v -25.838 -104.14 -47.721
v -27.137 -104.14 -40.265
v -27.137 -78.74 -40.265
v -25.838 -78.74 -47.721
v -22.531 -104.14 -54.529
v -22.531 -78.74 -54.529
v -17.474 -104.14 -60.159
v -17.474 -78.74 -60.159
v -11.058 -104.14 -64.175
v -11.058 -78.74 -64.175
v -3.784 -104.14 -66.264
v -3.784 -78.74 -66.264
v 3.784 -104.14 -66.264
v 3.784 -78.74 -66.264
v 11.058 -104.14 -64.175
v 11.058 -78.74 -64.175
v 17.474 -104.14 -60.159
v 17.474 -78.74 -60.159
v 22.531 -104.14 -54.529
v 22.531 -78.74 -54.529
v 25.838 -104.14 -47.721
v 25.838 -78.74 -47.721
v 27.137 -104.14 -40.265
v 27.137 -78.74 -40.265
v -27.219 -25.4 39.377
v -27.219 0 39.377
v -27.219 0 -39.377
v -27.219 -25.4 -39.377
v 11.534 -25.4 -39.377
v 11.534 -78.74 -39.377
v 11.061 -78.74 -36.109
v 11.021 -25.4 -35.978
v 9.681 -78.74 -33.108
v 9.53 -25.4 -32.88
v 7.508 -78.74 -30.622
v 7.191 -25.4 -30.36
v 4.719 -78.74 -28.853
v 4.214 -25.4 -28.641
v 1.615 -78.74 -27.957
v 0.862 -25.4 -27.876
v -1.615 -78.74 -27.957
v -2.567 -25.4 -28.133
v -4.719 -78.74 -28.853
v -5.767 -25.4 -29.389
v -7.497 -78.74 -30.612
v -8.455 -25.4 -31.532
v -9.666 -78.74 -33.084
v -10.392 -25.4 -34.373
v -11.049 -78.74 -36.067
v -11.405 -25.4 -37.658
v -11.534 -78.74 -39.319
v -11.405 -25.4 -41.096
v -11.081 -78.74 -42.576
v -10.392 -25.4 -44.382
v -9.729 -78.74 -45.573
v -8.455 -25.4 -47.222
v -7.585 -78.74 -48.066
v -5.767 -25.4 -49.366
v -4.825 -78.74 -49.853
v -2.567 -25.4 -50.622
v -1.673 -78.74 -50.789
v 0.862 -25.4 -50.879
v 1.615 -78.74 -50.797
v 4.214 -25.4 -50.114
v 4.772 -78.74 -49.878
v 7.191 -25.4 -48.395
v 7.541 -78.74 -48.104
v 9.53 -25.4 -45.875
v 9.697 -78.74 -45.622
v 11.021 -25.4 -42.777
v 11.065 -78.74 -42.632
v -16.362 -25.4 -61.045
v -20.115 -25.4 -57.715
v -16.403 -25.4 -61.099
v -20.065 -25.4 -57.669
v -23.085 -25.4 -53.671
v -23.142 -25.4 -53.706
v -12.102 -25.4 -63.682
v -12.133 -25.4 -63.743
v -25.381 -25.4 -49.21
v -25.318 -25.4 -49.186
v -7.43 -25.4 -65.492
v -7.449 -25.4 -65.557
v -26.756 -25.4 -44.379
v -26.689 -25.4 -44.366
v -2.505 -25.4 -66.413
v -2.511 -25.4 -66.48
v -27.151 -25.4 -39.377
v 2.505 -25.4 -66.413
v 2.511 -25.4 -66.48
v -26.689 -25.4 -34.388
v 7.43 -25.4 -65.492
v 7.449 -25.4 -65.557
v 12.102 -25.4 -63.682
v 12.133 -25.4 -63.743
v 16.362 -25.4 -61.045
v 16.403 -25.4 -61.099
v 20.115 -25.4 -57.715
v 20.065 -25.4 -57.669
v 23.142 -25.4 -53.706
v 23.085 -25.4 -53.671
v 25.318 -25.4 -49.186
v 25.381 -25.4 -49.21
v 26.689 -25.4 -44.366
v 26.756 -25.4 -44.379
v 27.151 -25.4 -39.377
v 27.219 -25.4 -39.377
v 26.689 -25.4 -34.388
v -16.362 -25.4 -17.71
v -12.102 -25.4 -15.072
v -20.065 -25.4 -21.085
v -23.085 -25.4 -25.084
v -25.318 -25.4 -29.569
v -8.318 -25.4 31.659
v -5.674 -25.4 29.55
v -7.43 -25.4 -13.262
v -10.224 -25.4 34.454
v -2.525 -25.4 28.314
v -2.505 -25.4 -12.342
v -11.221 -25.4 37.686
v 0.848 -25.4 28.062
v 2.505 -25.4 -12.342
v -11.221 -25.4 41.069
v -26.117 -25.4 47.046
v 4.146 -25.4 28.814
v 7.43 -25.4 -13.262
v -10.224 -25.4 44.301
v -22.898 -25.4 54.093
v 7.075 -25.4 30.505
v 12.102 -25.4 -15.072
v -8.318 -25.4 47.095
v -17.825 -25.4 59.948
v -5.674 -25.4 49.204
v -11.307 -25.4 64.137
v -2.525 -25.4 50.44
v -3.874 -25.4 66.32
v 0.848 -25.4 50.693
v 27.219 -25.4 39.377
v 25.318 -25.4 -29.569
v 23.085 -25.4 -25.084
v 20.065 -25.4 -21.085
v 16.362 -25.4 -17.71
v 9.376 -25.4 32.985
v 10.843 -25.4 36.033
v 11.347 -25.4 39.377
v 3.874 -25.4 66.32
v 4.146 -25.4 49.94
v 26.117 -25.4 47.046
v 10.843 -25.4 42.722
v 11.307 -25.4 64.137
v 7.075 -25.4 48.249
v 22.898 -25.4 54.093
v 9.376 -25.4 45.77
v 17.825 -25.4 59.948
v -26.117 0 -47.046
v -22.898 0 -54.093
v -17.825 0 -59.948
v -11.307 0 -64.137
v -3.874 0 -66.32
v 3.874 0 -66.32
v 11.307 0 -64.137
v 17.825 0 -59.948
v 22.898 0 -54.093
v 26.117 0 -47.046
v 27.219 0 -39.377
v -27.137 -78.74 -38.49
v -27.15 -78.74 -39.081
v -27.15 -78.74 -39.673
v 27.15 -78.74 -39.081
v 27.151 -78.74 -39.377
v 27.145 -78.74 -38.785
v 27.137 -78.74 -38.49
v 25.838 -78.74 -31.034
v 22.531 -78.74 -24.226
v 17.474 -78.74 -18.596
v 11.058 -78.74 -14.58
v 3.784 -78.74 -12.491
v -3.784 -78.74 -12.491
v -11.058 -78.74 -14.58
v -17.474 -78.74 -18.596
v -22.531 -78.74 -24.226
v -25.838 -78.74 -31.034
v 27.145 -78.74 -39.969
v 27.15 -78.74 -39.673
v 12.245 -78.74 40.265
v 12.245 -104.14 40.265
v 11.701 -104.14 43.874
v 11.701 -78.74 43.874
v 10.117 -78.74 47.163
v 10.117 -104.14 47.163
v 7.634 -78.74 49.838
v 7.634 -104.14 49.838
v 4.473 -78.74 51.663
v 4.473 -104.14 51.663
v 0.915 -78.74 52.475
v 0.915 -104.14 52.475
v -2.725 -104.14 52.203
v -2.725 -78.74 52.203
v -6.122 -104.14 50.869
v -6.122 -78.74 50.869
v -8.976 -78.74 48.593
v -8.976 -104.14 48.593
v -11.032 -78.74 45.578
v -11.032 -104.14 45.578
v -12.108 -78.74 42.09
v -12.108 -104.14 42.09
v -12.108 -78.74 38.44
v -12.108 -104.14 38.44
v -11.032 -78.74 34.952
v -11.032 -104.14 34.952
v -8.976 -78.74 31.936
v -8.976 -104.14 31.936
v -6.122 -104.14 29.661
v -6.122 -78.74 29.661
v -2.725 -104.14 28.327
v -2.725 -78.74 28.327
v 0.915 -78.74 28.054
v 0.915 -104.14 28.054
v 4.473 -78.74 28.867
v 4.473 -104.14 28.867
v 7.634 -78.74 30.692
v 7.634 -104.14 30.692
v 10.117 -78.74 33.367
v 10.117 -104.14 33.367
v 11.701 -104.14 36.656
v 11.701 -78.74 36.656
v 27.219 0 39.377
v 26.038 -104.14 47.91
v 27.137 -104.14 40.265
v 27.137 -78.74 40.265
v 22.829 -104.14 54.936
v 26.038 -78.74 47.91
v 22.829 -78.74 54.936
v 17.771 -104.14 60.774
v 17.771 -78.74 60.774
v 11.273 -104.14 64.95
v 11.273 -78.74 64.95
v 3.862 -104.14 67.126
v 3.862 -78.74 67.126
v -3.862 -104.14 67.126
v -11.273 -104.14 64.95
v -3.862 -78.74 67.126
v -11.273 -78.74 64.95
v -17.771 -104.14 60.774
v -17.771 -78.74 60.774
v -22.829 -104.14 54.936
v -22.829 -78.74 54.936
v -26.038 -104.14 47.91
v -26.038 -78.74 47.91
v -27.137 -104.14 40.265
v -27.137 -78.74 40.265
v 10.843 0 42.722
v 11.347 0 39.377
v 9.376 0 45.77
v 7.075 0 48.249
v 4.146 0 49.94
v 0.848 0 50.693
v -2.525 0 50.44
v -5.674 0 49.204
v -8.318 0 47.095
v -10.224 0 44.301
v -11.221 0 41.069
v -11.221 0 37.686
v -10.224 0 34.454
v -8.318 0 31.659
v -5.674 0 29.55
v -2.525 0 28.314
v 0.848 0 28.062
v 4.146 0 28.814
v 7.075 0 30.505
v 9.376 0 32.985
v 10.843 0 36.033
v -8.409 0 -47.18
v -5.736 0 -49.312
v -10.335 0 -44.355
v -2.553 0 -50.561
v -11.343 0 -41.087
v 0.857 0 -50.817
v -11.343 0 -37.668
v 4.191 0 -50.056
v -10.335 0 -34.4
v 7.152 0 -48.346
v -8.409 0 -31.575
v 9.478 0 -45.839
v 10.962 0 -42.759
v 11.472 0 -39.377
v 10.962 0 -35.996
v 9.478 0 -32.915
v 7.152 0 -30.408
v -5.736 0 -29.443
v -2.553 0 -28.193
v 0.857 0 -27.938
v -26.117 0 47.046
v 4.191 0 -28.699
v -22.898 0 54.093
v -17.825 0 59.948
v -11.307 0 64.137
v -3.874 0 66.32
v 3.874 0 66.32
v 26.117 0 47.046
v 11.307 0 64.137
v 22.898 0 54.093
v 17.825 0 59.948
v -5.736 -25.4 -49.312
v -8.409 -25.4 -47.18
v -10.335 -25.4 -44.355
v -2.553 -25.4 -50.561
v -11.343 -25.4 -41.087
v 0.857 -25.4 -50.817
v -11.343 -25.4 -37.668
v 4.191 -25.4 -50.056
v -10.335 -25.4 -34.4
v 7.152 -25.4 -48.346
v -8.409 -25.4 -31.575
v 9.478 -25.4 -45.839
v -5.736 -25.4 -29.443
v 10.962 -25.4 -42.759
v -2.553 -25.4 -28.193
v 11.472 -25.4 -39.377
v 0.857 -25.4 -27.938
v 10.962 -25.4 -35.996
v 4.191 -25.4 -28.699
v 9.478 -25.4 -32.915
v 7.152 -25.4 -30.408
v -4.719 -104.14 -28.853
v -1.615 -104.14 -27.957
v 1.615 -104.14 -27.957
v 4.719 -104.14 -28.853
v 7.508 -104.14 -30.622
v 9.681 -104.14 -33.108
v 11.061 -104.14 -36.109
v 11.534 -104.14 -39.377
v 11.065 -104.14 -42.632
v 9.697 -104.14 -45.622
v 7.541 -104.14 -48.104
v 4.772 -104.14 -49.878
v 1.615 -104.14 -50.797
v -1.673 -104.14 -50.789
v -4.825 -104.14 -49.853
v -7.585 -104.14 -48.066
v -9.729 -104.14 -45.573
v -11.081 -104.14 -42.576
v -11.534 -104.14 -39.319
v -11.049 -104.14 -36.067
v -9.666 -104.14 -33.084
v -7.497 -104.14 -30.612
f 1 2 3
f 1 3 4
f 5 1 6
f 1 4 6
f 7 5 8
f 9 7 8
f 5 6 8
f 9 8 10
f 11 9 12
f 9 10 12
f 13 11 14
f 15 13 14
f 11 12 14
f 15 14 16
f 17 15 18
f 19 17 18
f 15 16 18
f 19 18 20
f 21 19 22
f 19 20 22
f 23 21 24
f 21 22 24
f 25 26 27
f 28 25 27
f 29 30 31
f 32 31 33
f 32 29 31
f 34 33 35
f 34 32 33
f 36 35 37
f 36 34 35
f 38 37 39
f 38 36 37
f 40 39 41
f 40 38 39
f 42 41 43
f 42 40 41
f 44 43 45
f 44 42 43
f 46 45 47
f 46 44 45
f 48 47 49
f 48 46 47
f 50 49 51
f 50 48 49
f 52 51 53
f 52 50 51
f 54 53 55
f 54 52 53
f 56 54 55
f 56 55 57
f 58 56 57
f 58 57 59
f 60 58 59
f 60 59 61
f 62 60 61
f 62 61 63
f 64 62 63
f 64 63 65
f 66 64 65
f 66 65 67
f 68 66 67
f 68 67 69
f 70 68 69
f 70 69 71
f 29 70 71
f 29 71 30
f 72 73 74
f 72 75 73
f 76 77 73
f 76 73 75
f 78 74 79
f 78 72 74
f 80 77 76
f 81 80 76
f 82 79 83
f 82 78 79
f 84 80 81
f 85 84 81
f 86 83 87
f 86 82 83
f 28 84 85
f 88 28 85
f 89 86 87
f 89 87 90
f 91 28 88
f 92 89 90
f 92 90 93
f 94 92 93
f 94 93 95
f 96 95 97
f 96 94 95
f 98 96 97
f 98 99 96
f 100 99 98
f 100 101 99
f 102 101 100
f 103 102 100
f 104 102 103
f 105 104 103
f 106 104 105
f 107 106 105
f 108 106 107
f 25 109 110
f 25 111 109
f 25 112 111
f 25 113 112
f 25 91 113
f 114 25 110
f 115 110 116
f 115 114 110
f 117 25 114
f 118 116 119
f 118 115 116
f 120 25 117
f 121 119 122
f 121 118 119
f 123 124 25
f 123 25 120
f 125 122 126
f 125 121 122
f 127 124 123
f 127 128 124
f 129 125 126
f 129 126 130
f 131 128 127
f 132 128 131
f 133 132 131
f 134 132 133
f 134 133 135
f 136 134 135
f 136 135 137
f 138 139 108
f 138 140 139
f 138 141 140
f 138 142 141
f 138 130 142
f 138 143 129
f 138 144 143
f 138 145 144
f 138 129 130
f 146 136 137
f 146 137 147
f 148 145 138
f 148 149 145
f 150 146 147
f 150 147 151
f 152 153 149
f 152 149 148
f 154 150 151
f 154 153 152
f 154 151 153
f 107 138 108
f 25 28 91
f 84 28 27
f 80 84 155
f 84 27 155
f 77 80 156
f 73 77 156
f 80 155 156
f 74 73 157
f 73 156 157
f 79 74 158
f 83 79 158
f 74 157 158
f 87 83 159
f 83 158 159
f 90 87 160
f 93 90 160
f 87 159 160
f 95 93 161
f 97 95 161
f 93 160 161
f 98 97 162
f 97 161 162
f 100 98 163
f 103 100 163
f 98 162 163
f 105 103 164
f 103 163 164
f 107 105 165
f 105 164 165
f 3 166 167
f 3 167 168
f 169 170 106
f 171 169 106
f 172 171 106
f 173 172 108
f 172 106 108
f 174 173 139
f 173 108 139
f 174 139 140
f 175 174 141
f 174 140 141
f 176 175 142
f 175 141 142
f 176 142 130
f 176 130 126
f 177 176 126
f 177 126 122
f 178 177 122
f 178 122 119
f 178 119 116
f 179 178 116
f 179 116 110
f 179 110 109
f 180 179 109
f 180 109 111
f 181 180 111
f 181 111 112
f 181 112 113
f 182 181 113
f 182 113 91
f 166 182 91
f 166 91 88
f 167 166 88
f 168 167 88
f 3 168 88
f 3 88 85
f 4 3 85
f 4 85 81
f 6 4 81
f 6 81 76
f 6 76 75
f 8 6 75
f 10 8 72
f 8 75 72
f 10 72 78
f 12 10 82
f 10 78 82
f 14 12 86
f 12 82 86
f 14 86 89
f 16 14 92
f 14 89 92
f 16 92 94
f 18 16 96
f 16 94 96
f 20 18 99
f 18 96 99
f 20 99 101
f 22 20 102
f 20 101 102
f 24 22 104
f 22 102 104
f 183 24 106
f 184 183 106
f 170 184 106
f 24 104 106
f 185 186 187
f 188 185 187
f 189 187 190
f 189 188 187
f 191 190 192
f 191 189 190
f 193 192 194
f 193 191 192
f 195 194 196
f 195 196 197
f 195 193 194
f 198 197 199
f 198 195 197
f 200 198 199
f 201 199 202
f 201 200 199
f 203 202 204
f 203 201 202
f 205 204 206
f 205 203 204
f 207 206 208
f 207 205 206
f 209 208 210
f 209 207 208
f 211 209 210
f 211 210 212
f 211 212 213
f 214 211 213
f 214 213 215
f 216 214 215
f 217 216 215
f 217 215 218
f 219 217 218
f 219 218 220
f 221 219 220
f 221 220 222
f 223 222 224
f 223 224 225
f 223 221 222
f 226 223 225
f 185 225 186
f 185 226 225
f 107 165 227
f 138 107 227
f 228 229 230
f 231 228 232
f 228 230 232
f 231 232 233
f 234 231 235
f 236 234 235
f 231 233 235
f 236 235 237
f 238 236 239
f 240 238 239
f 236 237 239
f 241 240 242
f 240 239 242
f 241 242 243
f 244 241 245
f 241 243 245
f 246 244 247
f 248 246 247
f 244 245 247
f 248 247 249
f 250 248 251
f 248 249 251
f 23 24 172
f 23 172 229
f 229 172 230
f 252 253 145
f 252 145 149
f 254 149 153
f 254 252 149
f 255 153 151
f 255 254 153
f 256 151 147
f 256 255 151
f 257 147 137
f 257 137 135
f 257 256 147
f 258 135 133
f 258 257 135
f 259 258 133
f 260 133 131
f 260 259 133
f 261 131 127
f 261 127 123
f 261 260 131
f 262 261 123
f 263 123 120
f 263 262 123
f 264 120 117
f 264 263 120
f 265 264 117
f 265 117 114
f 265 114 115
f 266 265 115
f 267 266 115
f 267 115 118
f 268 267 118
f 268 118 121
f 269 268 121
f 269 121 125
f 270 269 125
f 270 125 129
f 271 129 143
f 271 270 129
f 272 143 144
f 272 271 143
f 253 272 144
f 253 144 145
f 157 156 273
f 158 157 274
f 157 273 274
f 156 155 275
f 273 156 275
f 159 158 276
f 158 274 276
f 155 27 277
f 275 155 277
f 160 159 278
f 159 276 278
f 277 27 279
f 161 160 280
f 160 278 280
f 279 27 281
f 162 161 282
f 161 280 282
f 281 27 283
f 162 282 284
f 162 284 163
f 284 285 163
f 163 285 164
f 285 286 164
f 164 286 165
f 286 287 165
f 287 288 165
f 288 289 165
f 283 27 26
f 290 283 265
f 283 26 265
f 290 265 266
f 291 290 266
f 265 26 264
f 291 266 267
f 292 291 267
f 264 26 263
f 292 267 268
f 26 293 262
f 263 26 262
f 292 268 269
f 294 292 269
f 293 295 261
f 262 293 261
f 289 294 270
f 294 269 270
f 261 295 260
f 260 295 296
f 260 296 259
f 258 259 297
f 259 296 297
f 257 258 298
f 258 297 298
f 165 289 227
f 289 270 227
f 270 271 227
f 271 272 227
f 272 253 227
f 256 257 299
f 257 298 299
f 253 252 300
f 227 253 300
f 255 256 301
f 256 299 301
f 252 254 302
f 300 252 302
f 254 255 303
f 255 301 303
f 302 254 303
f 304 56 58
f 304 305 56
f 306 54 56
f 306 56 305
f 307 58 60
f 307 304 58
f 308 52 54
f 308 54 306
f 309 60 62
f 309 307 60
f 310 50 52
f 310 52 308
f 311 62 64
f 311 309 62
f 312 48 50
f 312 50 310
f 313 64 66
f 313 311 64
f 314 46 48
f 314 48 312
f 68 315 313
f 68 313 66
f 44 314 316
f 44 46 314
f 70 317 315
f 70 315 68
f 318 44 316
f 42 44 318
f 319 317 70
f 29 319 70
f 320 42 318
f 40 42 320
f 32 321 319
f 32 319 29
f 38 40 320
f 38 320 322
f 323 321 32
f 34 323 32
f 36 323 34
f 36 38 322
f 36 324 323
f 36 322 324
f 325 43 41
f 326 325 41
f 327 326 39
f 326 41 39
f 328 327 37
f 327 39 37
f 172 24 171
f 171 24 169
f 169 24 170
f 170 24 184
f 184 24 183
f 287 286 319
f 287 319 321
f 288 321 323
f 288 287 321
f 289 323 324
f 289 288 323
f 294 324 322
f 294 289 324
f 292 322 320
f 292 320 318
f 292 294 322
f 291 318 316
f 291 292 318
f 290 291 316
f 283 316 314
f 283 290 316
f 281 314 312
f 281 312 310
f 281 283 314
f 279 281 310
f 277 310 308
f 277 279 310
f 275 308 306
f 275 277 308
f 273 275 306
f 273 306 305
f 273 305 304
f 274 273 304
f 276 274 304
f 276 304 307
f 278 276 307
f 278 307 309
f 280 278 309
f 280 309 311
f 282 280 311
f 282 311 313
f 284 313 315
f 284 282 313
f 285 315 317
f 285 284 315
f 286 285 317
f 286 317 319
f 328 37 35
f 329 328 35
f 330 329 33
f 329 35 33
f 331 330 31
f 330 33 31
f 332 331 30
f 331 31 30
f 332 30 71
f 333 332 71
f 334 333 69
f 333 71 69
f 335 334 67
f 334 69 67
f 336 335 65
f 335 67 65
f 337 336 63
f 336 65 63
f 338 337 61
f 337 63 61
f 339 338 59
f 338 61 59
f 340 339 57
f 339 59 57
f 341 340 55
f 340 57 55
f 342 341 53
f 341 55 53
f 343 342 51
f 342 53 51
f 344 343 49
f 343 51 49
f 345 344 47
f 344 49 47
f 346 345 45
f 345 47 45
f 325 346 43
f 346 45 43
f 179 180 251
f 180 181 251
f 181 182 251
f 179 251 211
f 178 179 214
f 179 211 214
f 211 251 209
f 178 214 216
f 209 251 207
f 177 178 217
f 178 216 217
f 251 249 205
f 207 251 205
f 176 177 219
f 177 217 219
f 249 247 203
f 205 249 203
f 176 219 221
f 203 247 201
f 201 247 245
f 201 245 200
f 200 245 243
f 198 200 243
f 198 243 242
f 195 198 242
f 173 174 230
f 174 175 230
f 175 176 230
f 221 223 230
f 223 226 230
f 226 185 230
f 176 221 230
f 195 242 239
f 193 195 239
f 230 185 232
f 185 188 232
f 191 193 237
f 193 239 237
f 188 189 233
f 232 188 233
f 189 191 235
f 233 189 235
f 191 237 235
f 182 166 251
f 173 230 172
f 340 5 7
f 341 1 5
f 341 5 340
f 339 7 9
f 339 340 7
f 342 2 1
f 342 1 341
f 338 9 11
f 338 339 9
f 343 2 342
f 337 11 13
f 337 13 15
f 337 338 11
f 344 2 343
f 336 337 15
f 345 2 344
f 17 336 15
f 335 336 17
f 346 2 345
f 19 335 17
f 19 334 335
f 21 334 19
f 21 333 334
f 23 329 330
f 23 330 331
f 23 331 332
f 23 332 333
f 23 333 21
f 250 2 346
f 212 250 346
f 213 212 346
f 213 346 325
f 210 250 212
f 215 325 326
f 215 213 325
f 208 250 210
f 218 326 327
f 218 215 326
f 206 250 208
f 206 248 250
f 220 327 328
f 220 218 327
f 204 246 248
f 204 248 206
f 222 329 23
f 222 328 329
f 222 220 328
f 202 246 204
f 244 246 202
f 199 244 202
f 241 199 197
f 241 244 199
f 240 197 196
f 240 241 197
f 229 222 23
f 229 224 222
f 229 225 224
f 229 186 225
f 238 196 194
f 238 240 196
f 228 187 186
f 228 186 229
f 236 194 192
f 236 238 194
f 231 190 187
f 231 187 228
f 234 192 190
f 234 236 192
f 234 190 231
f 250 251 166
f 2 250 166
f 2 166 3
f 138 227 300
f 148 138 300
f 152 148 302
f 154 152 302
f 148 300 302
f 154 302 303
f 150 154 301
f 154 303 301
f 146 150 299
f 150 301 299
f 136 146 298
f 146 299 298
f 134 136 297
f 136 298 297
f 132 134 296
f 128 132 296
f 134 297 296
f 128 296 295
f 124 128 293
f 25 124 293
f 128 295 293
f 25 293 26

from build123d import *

# Parameters (mm, degrees)
F0_R     = 11.4715226447
F0_R_2   = 11.3474489307
F1_DEPTH = 25.4
F2_R     = 27.1514716213
F2_R_2   = 11.5339058998
F3_DEPTH = 53.34
F4_R     = 12.2446750111
F5_DEPTH = 25.4


with BuildPart() as f1:
    # F0 (on Front) → F1 (new body)
    with BuildSketch(Plane.XZ):
        with BuildLine():
            ThreePointArc((-27.219299227, -39.3772572279), (0, -12.1579580009), (27.219299227, -39.3772572279))
            Line((27.219299227, -39.3772572279), (27.219299227, 39.3772572279))
            ThreePointArc((27.219299227, 39.3772572279), (0, 12.1579580009), (-27.219299227, 39.3772572279))
            Line((-27.219299227, 39.3772572279), (-27.219299227, -39.3772572279))
        make_face()
        with BuildLine():
            ThreePointArc((-27.219299227, -39.3772572279), (0, -66.5965564549), (27.219299227, -39.3772572279))
            ThreePointArc((27.219299227, -39.3772572279), (0, -12.1579580009), (-27.219299227, -39.3772572279))
        make_face()
        with Locations((0, -39.3772572279)):
            Circle(F0_R, mode=Mode.SUBTRACT)
        with BuildLine():
            ThreePointArc((-27.219299227, 39.3772572279), (0, 12.1579580009), (27.219299227, 39.3772572279))
            ThreePointArc((27.219299227, 39.3772572279), (0, 66.5965564549), (-27.219299227, 39.3772572279))
        make_face()
        with Locations((0, 39.3772572279)):
            Circle(F0_R_2, mode=Mode.SUBTRACT)
    extrude(amount=F1_DEPTH)

    # F2 (on face) → F3 (join)
    with BuildSketch(Plane.XZ.offset(25.4)):
        with Locations((0, -39.3772572279)):
            Circle(F2_R)
        with Locations((0, -39.3772572279)):
            Circle(F2_R_2, mode=Mode.SUBTRACT)
    extrude(amount=F3_DEPTH)

    # F4 (on face) → F5 (join)
    with BuildSketch(Plane.XZ.offset(78.74)):
        with BuildLine():
            ThreePointArc((-27.1369592055, -40.2648699161), (0, -66.5287288492), (27.1369592055, -40.2648699161))
            Line((27.1369592055, -40.2648699161), (27.1369592055, -38.4896445397))
            ThreePointArc((27.1369592055, -38.4896445397), (0, -12.2257856066), (-27.1369592055, -38.4896445397))
            Line((-27.1369592055, -38.4896445397), (-27.1369592055, -40.2648699161))
        make_face()
        with BuildLine():
            ThreePointArc((4.719235111, -28.8530087858), (10.2659715637, -33.4010821613), (12.3491600723, -40.2648699161))
            ThreePointArc((12.3491600723, -40.2648699161), (-6.8637877548, -50.5308414798), (-4.719235111, -28.8530087858))
            ThreePointArc((-4.719235111, -28.8530087858), (0, -27.8433513281), (4.719235111, -28.8530087858))
        make_face(mode=Mode.SUBTRACT)
        with BuildLine():
            ThreePointArc((-27.1369592055, -38.4896445397), (0, -12.2257856066), (27.1369592055, -38.4896445397))
            Line((27.1369592055, -38.4896445397), (27.1369592055, 40.2648699161))
            ThreePointArc((27.1369592055, 40.2648699161), (0, 13.1279107106), (-27.1369592055, 40.2648699161))
            Line((-27.1369592055, 40.2648699161), (-27.1369592055, -38.4896445397))
        make_face()
        with BuildLine():
            ThreePointArc((-27.1369592055, 40.2648699161), (0, 13.1279107106), (27.1369592055, 40.2648699161))
            ThreePointArc((27.1369592055, 40.2648699161), (0, 67.4018291216), (-27.1369592055, 40.2648699161))
        make_face()
        with Locations((0, 40.2648699161)):
            Circle(F4_R, mode=Mode.SUBTRACT)
        with BuildLine():
            ThreePointArc((-4.719235111, -28.8530087858), (-6.8637877548, -50.5308414798), (12.3491600723, -40.2648699161))
            ThreePointArc((12.3491600723, -40.2648699161), (10.2659715637, -33.4010821613), (4.719235111, -28.8530087858))
            ThreePointArc((4.719235111, -28.8530087858), (9.6814822985, -33.1082951282), (11.5339058998, -39.3772572279))
            ThreePointArc((11.5339058998, -39.3772572279), (-6.2689620997, -49.0587395264), (-4.719235111, -28.8530087858))
        make_face()
    extrude(amount=F5_DEPTH)


solid = f1.part
